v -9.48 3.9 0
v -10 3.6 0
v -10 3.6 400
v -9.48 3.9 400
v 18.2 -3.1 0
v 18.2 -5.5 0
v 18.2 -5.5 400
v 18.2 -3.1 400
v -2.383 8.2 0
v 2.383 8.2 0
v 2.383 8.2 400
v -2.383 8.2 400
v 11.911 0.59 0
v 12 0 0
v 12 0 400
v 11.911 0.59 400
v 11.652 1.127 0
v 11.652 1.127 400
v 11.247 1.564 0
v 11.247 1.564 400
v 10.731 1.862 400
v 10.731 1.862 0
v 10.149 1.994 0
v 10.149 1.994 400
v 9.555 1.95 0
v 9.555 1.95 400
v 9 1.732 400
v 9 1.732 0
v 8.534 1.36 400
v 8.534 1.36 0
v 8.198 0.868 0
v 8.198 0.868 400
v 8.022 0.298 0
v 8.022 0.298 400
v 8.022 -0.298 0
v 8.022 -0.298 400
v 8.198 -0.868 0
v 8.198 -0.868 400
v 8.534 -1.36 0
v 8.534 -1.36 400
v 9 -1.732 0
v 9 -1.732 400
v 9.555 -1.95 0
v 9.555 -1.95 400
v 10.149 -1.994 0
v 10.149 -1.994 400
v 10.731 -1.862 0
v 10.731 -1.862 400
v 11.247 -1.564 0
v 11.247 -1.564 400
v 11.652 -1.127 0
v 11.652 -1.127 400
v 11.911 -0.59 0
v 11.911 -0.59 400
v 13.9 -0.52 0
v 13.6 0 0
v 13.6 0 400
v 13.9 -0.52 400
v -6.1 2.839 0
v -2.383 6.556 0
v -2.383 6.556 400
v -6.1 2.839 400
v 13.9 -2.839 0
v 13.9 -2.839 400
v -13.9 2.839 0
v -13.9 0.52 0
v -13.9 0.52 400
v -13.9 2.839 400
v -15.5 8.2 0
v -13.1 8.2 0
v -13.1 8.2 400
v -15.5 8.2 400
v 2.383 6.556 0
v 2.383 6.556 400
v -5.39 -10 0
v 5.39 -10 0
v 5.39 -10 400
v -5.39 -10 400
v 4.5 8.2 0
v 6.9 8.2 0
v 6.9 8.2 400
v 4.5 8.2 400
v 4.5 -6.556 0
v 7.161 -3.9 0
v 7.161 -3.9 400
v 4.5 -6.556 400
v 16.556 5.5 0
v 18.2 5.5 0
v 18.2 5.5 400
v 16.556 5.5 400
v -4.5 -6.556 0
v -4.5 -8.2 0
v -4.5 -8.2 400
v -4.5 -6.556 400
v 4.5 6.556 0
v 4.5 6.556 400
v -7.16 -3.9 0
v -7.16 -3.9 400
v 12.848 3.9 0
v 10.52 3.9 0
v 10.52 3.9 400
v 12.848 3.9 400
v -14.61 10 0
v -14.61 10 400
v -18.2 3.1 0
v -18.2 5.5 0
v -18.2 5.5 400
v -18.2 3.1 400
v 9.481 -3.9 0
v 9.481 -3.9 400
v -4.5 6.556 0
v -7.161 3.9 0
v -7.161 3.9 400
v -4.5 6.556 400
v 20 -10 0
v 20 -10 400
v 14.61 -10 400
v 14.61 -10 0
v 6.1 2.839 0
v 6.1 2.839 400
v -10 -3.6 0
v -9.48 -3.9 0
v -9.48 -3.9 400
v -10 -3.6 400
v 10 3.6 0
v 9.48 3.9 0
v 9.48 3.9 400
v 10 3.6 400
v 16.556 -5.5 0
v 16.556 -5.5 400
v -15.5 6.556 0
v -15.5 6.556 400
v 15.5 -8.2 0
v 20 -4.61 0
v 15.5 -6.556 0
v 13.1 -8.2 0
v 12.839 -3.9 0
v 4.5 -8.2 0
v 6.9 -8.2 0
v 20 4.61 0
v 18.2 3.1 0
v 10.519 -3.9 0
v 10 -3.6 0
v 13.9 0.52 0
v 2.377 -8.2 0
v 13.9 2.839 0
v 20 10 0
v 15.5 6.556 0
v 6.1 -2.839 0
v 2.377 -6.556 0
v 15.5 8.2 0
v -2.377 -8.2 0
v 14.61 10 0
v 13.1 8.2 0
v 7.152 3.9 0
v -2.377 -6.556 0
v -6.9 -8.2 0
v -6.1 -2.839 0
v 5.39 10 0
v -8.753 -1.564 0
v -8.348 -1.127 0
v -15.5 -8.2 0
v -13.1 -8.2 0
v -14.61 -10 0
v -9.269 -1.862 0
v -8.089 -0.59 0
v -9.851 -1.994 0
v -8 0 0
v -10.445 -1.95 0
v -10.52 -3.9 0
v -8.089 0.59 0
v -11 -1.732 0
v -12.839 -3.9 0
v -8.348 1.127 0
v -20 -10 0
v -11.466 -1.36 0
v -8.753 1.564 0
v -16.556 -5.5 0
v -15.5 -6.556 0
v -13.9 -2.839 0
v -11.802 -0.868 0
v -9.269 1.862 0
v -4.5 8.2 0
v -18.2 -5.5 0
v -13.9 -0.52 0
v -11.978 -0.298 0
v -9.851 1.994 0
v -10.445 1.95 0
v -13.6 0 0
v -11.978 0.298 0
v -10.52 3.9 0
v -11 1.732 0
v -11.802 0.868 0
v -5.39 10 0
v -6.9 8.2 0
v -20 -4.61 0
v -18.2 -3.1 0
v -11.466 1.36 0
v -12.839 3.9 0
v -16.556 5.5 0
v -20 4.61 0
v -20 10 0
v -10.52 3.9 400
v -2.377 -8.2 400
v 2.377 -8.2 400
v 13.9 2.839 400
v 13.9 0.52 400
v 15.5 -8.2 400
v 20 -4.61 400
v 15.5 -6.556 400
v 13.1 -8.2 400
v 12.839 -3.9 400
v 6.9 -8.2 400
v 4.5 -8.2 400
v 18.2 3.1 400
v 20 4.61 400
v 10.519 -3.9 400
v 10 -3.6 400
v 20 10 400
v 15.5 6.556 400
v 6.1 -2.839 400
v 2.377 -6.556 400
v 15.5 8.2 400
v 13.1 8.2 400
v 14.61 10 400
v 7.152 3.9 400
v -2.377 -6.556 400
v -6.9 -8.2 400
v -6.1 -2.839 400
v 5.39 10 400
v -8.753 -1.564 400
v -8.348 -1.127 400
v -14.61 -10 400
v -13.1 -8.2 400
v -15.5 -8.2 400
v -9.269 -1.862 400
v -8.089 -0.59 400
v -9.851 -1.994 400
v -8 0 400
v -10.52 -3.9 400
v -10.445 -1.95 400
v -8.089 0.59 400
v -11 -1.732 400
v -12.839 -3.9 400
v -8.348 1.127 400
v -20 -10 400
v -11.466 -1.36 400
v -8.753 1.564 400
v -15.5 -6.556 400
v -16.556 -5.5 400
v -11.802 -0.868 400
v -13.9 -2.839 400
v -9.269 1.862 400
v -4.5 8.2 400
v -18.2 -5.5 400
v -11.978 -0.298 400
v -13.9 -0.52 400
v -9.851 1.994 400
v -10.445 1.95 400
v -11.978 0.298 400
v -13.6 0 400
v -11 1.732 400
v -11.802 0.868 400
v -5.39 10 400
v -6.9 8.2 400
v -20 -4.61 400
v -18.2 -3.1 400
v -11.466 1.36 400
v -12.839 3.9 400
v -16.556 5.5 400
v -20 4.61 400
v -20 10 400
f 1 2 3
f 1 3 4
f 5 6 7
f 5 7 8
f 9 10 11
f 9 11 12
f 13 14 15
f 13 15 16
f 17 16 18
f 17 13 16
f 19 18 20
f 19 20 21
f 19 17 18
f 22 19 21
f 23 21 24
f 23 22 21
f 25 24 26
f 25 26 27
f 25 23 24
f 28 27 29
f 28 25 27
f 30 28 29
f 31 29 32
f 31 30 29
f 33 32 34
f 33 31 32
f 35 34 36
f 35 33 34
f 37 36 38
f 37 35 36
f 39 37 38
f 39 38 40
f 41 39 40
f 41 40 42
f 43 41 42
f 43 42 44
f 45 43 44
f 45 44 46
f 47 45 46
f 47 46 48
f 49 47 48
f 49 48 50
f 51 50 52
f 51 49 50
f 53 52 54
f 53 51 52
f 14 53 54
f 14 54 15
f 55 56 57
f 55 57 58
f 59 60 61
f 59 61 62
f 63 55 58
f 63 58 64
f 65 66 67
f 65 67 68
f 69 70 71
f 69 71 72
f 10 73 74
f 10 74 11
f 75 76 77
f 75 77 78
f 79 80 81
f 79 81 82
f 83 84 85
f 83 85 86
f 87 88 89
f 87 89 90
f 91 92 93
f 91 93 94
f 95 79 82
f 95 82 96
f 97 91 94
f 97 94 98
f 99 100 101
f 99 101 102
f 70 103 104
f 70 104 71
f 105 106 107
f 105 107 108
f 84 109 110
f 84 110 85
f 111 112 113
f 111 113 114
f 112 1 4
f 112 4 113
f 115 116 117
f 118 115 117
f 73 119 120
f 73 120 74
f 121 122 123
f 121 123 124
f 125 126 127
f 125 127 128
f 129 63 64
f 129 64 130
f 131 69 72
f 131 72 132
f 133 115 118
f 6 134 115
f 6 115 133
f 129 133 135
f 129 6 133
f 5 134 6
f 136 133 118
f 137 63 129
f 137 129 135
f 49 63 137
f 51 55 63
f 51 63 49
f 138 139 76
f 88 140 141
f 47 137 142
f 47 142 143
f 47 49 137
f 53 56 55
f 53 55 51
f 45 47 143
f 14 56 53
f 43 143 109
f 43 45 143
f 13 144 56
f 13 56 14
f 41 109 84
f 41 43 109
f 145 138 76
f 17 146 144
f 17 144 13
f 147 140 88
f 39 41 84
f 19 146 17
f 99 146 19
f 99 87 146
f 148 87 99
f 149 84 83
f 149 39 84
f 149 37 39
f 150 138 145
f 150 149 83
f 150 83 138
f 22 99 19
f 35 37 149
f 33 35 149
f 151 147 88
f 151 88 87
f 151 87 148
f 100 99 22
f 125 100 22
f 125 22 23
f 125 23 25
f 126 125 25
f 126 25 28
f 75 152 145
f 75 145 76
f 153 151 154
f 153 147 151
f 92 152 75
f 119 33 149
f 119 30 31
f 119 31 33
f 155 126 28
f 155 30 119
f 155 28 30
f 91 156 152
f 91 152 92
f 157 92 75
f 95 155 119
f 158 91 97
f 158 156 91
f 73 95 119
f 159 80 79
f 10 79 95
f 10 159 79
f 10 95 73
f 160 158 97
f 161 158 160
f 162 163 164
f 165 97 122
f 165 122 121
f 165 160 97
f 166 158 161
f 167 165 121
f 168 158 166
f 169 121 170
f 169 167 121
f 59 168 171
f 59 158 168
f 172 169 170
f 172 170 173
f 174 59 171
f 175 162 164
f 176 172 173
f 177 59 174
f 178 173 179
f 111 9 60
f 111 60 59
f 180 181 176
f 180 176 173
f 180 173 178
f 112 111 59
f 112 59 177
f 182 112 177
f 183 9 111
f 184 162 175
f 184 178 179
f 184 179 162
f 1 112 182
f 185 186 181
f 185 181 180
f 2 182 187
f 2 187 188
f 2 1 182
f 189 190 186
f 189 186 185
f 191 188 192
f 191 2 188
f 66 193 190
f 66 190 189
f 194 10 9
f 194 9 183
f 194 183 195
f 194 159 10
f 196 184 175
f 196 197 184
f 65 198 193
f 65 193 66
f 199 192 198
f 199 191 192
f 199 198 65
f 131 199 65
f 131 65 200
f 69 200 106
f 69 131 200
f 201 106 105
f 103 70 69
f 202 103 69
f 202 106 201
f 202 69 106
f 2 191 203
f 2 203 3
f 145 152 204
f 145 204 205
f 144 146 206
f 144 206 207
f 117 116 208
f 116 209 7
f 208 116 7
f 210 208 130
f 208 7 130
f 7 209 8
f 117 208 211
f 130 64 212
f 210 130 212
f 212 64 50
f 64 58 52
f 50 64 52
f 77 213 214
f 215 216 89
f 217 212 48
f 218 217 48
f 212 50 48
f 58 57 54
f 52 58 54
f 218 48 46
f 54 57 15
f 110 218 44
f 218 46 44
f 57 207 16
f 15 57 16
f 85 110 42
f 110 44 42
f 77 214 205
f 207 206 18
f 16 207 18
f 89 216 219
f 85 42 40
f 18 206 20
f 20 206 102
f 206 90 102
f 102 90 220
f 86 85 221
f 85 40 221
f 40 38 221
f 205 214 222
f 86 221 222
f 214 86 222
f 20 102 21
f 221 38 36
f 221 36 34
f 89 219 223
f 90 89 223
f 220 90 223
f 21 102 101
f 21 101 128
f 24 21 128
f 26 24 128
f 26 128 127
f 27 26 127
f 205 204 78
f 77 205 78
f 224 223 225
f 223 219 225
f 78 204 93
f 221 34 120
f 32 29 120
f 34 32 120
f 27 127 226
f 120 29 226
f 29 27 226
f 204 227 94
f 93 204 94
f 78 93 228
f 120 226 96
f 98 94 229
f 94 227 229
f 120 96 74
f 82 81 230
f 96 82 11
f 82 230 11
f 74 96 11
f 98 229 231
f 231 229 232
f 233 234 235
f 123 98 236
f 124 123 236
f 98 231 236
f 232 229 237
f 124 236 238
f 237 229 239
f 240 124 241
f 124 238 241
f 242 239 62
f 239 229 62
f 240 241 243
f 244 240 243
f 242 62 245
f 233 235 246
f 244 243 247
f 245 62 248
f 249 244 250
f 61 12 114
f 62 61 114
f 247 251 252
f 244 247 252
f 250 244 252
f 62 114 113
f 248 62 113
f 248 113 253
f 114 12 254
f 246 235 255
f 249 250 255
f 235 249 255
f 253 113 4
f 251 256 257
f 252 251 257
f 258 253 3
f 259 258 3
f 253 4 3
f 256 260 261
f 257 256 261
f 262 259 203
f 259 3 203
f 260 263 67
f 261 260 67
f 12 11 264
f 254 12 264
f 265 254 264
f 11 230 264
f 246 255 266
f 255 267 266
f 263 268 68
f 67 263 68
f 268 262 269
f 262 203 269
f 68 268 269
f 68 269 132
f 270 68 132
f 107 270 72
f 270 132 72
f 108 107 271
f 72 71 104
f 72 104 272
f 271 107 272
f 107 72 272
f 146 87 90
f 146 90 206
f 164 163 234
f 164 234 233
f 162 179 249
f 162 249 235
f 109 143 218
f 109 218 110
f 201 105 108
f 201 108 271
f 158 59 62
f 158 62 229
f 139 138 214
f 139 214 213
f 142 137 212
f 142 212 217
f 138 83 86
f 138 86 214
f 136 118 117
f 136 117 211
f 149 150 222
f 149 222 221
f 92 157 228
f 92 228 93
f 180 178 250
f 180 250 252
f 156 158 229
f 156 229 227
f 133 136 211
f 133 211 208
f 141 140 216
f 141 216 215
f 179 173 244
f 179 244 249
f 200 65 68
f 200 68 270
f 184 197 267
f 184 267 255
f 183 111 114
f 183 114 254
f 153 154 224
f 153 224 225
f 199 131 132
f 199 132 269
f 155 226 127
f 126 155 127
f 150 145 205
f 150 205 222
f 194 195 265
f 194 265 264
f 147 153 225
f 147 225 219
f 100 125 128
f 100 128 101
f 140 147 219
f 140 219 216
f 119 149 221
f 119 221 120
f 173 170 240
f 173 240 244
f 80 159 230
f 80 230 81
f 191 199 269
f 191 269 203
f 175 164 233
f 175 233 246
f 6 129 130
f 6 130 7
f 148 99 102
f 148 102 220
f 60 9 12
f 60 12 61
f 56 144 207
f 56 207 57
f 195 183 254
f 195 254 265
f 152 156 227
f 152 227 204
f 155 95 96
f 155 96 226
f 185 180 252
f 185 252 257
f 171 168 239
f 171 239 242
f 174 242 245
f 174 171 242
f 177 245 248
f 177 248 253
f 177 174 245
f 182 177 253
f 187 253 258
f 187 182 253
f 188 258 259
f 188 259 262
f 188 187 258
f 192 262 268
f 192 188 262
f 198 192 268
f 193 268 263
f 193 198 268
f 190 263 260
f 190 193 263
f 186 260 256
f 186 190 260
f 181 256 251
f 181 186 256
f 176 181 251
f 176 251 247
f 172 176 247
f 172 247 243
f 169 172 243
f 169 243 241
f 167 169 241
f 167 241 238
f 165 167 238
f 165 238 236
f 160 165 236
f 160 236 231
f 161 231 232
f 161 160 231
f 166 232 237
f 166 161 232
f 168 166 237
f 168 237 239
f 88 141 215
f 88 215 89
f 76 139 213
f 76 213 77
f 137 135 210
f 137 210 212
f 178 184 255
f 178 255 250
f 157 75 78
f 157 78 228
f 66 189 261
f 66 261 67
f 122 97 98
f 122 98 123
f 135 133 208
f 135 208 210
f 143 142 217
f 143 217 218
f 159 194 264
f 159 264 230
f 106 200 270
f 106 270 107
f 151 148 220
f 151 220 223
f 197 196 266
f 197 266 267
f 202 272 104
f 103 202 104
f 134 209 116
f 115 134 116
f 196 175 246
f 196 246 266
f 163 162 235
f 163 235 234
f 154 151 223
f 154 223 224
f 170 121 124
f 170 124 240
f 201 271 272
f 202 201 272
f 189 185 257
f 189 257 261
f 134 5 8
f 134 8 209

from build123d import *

# Parameters (mm, degrees)
SKETCH1_R           = 2
BOSS_EXTRUDE1_DEPTH = 400


with BuildPart() as part:
    # Sketch1 → Boss-Extrude1 (new body)
    with BuildSketch(Plane.XY):
        Polygon((-5.389620664, 10), (5.389620664, 10), (6.9, 8.2), (4.5, 8.2), (4.5, 6.556171609), (7.151917065, 3.899773171), (9.480384758, 3.899773171), (10, 3.599773171), (10.519615242, 3.899773171), (12.848082935, 3.899773171), (15.5, 6.556171609), (15.5, 8.2), (13.1, 8.2), (14.610379336, 10), (20, 10), (20, 4.610379336), (18.2, 3.1), (18.2, 5.5), (16.556171609, 5.5), (13.9, 2.839339828), (13.9, 0.519615231), (13.599999981, 0), (13.9, -0.519615231), (13.9, -2.839339828), (16.556171609, -5.5), (18.2, -5.5), (18.2, -3.1), (20, -4.610379336), (20, -10), (14.610379336, -10), (13.1, -8.2), (15.5, -8.2), (15.5, -6.556171609), (12.839339828, -3.9), (10.519222362, -3.9), (10, -3.600226829), (9.480777638, -3.9), (7.160660172, -3.9), (4.5, -6.556171609), (4.5, -8.2), (6.9, -8.2), (5.389620664, -10), (-5.389620664, -10), (-6.9, -8.2), (-4.5, -8.2), (-4.5, -6.556171609), (-7.160432959, -3.900226829), (-9.480384758, -3.900226829), (-10, -3.600226829), (-10.519615242, -3.900226829), (-12.839339828, -3.9), (-15.5, -6.556171609), (-15.5, -8.2), (-13.1, -8.2), (-14.610379336, -10), (-20, -10), (-20, -4.610379336), (-18.2, -3.1), (-18.2, -5.5), (-16.556171609, -5.5), (-13.9, -2.839339828), (-13.9, -0.519615231), (-13.599999981, 0), (-13.9, 0.519615231), (-13.9, 2.839339828), (-16.556171609, 5.5), (-18.2, 5.5), (-18.2, 3.1), (-20, 4.610379336), (-20, 10), (-14.610379336, 10), (-13.1, 8.2), (-15.5, 8.2), (-15.5, 6.556171609), (-12.839339828, 3.9), (-10.519615242, 3.899773171), (-10, 3.599773171), (-9.480384758, 3.899773171), (-7.160660172, 3.9), (-4.5, 6.556171609), (-4.5, 8.2), (-6.9, 8.2), align=None)
        with Locations((-10, 0)):
            Circle(SKETCH1_R, mode=Mode.SUBTRACT)
        with Locations((10, 0)):
            Circle(SKETCH1_R, mode=Mode.SUBTRACT)
        Polygon((-6.1, -2.839339828), (-2.376887287, -6.556171609), (-2.376887287, -8.2), (2.376887287, -8.2), (2.376887287, -6.556171609), (6.1, -2.839339828), (6.1, 2.839339828), (2.383168219, 6.556171609), (2.383168219, 8.2), (-2.383168219, 8.2), (-2.383168219, 6.556171609), (-6.1, 2.839339828), align=None, mode=Mode.SUBTRACT)
    extrude(amount=BOSS_EXTRUDE1_DEPTH)


solid = part.part
